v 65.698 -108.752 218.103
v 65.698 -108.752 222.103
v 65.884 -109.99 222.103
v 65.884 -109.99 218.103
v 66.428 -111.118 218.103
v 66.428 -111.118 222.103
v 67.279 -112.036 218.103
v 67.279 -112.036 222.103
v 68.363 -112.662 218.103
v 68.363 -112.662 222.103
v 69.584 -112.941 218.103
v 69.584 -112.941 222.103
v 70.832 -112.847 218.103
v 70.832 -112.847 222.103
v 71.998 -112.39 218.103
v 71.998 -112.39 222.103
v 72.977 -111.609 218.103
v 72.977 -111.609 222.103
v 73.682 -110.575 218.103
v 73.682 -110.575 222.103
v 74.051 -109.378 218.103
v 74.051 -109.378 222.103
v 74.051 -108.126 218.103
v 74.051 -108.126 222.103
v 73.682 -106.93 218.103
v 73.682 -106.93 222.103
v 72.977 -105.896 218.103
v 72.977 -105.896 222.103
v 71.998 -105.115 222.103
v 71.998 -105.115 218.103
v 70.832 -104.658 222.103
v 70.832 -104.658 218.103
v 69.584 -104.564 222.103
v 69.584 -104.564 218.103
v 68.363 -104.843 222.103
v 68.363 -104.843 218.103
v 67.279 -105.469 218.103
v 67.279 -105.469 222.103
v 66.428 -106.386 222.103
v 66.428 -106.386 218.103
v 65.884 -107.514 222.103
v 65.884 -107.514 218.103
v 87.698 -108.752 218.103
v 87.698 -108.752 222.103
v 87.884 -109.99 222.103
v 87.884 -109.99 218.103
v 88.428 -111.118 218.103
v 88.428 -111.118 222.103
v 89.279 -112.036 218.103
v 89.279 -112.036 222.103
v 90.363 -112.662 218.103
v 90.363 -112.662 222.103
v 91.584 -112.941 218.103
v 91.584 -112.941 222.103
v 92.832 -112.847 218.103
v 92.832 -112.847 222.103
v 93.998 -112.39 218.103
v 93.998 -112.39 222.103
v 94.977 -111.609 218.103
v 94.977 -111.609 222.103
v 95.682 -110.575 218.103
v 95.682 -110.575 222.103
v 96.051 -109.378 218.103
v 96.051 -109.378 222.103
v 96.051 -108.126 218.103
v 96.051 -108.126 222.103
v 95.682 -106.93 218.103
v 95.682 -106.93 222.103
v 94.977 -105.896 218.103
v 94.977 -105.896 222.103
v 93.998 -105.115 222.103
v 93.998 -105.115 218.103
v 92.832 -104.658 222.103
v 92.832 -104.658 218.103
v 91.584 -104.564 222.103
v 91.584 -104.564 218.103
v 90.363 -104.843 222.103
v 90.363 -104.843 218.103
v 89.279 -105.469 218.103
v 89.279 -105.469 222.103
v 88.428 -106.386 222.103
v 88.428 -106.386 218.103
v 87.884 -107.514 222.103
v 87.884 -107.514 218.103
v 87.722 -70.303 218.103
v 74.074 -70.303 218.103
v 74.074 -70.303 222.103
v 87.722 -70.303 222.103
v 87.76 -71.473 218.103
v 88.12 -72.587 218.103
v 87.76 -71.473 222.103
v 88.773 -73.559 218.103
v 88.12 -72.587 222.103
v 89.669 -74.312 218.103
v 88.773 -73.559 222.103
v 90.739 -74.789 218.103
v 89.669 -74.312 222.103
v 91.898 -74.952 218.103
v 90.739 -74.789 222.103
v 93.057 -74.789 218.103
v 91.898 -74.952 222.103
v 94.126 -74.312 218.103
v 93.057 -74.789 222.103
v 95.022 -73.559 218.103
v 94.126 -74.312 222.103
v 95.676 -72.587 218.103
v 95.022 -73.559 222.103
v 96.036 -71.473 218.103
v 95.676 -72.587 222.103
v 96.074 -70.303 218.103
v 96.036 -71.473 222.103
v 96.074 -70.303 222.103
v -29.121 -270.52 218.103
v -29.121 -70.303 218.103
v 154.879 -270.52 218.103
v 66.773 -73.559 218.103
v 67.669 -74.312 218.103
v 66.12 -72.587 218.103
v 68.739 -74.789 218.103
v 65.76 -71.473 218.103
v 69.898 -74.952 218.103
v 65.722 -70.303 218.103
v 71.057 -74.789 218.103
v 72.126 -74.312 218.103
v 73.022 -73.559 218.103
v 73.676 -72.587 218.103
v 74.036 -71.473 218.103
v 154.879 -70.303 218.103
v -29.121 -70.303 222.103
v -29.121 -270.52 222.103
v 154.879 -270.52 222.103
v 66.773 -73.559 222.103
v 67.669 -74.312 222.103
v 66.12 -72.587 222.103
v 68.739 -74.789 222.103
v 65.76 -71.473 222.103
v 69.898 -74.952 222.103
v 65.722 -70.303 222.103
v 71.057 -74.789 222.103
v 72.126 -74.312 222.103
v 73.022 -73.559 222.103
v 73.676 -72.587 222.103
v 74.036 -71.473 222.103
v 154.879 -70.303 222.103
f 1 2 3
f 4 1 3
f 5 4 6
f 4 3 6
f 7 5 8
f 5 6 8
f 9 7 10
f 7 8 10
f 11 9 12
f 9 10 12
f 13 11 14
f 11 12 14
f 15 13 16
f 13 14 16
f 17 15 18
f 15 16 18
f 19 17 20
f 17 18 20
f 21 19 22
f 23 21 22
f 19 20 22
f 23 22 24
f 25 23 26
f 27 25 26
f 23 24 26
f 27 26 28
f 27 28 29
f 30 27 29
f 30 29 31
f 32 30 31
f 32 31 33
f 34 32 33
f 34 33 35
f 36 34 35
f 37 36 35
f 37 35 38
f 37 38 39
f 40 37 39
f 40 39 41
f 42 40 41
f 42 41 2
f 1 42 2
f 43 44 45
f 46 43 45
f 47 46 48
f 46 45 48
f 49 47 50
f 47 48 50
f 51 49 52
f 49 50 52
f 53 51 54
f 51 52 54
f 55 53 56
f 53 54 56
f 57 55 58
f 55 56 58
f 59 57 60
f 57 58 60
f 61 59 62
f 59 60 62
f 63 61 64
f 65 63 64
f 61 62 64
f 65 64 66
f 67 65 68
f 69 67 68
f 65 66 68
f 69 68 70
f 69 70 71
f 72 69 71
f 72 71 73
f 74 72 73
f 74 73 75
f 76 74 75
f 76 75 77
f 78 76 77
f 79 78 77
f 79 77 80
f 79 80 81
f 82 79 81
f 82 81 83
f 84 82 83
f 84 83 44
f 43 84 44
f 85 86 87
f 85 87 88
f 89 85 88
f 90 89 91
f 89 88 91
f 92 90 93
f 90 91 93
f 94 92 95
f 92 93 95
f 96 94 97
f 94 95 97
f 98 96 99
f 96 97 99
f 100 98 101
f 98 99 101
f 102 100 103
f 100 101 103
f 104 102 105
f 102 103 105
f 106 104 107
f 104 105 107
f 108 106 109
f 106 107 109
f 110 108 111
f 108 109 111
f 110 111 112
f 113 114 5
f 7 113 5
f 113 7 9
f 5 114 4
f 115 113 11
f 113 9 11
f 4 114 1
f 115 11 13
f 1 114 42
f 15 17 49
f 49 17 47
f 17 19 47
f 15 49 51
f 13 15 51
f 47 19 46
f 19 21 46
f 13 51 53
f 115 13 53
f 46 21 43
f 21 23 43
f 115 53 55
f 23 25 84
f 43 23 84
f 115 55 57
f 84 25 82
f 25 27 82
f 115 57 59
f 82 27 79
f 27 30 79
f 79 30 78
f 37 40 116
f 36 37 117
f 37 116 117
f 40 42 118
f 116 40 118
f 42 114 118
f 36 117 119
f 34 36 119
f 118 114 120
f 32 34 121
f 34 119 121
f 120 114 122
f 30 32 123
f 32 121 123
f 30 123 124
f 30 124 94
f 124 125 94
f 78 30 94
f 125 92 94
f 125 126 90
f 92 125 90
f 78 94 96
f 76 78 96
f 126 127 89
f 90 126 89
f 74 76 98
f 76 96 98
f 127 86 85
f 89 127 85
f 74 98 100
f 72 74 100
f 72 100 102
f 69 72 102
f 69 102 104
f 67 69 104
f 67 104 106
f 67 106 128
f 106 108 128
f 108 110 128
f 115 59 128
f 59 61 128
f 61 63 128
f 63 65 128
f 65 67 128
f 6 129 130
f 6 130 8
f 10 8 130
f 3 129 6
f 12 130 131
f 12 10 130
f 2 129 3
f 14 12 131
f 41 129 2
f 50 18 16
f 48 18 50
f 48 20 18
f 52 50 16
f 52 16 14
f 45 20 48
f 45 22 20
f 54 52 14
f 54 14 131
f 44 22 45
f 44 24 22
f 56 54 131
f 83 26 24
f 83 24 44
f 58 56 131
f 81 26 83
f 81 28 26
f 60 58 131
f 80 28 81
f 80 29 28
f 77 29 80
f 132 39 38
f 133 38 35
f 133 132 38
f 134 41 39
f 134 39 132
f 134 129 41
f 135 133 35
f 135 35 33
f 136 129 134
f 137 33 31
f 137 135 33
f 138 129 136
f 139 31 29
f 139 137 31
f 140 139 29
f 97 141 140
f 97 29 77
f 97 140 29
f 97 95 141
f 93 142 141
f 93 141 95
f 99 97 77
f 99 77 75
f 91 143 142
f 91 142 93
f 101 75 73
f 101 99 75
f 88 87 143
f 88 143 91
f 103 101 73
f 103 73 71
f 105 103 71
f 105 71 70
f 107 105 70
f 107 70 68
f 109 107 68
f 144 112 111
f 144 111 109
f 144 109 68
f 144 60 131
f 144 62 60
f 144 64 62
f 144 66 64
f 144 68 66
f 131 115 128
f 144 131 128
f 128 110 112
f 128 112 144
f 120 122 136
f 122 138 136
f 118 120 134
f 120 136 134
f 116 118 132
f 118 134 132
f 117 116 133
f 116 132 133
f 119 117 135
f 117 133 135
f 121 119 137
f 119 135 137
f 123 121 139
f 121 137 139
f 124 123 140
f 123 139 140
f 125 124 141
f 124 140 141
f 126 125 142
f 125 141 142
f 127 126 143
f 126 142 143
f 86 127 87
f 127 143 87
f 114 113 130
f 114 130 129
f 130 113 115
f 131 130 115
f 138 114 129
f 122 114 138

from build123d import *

# Parameters (mm, degrees)
SCHIZZO1_W                   = 184
SCHIZZO1_H                   = 200.217102587
ESTRUSIONE_ESTRUSIONE1_DEPTH = 4
M8_CLEARANCE_HOLE2_D         = 8.4


with BuildPart() as part:
    # Schizzo1 → Estrusione-Estrusione1 (new body)
    with BuildSketch(Plane.XY.offset(218.103339909)):
        with Locations((62.879048982, -170.411757868)):
            Rectangle(SCHIZZO1_W, SCHIZZO1_H)
    extrude(amount=ESTRUSIONE_ESTRUSIONE1_DEPTH)

    # M8 Clearance Hole2 (through all)
    with Locations(Plane(origin=(0, 0, 218.103339909), x_dir=(1, 0, 0), z_dir=(0, 0, -1))):
        with Locations((91.897840875, 70.752400597), (69.897840875, 70.752400597), (91.897840875, 108.752400597), (69.897840875, 108.752400597)):
            Hole(M8_CLEARANCE_HOLE2_D / 2)


solid = part.part
